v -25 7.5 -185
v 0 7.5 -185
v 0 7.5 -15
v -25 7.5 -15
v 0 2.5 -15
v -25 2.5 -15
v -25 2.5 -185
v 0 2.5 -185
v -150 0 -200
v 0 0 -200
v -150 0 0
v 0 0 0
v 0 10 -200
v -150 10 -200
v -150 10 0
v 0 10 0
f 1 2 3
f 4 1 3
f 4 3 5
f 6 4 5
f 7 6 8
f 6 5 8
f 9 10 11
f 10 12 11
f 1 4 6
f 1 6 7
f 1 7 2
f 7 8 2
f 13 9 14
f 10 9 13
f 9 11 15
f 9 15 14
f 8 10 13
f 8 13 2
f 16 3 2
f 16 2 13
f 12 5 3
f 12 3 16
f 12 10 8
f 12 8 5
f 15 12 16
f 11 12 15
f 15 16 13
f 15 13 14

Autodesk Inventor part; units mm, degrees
ref_plane "YZ Plane" through (0, 0, 0) normal (1, 0, 0) x (0, 1, 0)
ref_plane "XZ Plane" through (0, 0, 0) normal (0, 1, 0) x (-1, 0, 0)
ref_plane "XY Plane" through (0, 0, 0) normal (0, 0, 1) x (1, 0, 0)
sketch "Sketch1" plane through (0, 0, 0) normal (0, 1, 0) x (-1, 0, 0)
  line L0 (0, 0) -> (150, 0)
  line L1 (150, 0) -> (150, -200)
  line L2 (150, -200) -> (0, -200)
  line L3 (0, -200) -> (0, 0)
  dimension "d0" = 150
  dimension "d1" = 200
extrude "Extrusion1" add sketch "Sketch1" along normal blind 10
sketch "Sketch2" plane through (0, 0, 0) normal (1, 0, 0) x (0, 0, -1)
  line L0 (15, 2.5) -> (185, 2.5)
  line L1 (185, 2.5) -> (185, 7.5)
  line L2 (185, 7.5) -> (15, 7.5)
  line L3 (15, 7.5) -> (15, 2.5)
  point P0 (0, 0)
  dimension "d4" = 170
  dimension "d5" = 5
extrude "Extrusion2" cut sketch "Sketch2" against normal blind 25
properties part number "Chassis Upper - Female"
